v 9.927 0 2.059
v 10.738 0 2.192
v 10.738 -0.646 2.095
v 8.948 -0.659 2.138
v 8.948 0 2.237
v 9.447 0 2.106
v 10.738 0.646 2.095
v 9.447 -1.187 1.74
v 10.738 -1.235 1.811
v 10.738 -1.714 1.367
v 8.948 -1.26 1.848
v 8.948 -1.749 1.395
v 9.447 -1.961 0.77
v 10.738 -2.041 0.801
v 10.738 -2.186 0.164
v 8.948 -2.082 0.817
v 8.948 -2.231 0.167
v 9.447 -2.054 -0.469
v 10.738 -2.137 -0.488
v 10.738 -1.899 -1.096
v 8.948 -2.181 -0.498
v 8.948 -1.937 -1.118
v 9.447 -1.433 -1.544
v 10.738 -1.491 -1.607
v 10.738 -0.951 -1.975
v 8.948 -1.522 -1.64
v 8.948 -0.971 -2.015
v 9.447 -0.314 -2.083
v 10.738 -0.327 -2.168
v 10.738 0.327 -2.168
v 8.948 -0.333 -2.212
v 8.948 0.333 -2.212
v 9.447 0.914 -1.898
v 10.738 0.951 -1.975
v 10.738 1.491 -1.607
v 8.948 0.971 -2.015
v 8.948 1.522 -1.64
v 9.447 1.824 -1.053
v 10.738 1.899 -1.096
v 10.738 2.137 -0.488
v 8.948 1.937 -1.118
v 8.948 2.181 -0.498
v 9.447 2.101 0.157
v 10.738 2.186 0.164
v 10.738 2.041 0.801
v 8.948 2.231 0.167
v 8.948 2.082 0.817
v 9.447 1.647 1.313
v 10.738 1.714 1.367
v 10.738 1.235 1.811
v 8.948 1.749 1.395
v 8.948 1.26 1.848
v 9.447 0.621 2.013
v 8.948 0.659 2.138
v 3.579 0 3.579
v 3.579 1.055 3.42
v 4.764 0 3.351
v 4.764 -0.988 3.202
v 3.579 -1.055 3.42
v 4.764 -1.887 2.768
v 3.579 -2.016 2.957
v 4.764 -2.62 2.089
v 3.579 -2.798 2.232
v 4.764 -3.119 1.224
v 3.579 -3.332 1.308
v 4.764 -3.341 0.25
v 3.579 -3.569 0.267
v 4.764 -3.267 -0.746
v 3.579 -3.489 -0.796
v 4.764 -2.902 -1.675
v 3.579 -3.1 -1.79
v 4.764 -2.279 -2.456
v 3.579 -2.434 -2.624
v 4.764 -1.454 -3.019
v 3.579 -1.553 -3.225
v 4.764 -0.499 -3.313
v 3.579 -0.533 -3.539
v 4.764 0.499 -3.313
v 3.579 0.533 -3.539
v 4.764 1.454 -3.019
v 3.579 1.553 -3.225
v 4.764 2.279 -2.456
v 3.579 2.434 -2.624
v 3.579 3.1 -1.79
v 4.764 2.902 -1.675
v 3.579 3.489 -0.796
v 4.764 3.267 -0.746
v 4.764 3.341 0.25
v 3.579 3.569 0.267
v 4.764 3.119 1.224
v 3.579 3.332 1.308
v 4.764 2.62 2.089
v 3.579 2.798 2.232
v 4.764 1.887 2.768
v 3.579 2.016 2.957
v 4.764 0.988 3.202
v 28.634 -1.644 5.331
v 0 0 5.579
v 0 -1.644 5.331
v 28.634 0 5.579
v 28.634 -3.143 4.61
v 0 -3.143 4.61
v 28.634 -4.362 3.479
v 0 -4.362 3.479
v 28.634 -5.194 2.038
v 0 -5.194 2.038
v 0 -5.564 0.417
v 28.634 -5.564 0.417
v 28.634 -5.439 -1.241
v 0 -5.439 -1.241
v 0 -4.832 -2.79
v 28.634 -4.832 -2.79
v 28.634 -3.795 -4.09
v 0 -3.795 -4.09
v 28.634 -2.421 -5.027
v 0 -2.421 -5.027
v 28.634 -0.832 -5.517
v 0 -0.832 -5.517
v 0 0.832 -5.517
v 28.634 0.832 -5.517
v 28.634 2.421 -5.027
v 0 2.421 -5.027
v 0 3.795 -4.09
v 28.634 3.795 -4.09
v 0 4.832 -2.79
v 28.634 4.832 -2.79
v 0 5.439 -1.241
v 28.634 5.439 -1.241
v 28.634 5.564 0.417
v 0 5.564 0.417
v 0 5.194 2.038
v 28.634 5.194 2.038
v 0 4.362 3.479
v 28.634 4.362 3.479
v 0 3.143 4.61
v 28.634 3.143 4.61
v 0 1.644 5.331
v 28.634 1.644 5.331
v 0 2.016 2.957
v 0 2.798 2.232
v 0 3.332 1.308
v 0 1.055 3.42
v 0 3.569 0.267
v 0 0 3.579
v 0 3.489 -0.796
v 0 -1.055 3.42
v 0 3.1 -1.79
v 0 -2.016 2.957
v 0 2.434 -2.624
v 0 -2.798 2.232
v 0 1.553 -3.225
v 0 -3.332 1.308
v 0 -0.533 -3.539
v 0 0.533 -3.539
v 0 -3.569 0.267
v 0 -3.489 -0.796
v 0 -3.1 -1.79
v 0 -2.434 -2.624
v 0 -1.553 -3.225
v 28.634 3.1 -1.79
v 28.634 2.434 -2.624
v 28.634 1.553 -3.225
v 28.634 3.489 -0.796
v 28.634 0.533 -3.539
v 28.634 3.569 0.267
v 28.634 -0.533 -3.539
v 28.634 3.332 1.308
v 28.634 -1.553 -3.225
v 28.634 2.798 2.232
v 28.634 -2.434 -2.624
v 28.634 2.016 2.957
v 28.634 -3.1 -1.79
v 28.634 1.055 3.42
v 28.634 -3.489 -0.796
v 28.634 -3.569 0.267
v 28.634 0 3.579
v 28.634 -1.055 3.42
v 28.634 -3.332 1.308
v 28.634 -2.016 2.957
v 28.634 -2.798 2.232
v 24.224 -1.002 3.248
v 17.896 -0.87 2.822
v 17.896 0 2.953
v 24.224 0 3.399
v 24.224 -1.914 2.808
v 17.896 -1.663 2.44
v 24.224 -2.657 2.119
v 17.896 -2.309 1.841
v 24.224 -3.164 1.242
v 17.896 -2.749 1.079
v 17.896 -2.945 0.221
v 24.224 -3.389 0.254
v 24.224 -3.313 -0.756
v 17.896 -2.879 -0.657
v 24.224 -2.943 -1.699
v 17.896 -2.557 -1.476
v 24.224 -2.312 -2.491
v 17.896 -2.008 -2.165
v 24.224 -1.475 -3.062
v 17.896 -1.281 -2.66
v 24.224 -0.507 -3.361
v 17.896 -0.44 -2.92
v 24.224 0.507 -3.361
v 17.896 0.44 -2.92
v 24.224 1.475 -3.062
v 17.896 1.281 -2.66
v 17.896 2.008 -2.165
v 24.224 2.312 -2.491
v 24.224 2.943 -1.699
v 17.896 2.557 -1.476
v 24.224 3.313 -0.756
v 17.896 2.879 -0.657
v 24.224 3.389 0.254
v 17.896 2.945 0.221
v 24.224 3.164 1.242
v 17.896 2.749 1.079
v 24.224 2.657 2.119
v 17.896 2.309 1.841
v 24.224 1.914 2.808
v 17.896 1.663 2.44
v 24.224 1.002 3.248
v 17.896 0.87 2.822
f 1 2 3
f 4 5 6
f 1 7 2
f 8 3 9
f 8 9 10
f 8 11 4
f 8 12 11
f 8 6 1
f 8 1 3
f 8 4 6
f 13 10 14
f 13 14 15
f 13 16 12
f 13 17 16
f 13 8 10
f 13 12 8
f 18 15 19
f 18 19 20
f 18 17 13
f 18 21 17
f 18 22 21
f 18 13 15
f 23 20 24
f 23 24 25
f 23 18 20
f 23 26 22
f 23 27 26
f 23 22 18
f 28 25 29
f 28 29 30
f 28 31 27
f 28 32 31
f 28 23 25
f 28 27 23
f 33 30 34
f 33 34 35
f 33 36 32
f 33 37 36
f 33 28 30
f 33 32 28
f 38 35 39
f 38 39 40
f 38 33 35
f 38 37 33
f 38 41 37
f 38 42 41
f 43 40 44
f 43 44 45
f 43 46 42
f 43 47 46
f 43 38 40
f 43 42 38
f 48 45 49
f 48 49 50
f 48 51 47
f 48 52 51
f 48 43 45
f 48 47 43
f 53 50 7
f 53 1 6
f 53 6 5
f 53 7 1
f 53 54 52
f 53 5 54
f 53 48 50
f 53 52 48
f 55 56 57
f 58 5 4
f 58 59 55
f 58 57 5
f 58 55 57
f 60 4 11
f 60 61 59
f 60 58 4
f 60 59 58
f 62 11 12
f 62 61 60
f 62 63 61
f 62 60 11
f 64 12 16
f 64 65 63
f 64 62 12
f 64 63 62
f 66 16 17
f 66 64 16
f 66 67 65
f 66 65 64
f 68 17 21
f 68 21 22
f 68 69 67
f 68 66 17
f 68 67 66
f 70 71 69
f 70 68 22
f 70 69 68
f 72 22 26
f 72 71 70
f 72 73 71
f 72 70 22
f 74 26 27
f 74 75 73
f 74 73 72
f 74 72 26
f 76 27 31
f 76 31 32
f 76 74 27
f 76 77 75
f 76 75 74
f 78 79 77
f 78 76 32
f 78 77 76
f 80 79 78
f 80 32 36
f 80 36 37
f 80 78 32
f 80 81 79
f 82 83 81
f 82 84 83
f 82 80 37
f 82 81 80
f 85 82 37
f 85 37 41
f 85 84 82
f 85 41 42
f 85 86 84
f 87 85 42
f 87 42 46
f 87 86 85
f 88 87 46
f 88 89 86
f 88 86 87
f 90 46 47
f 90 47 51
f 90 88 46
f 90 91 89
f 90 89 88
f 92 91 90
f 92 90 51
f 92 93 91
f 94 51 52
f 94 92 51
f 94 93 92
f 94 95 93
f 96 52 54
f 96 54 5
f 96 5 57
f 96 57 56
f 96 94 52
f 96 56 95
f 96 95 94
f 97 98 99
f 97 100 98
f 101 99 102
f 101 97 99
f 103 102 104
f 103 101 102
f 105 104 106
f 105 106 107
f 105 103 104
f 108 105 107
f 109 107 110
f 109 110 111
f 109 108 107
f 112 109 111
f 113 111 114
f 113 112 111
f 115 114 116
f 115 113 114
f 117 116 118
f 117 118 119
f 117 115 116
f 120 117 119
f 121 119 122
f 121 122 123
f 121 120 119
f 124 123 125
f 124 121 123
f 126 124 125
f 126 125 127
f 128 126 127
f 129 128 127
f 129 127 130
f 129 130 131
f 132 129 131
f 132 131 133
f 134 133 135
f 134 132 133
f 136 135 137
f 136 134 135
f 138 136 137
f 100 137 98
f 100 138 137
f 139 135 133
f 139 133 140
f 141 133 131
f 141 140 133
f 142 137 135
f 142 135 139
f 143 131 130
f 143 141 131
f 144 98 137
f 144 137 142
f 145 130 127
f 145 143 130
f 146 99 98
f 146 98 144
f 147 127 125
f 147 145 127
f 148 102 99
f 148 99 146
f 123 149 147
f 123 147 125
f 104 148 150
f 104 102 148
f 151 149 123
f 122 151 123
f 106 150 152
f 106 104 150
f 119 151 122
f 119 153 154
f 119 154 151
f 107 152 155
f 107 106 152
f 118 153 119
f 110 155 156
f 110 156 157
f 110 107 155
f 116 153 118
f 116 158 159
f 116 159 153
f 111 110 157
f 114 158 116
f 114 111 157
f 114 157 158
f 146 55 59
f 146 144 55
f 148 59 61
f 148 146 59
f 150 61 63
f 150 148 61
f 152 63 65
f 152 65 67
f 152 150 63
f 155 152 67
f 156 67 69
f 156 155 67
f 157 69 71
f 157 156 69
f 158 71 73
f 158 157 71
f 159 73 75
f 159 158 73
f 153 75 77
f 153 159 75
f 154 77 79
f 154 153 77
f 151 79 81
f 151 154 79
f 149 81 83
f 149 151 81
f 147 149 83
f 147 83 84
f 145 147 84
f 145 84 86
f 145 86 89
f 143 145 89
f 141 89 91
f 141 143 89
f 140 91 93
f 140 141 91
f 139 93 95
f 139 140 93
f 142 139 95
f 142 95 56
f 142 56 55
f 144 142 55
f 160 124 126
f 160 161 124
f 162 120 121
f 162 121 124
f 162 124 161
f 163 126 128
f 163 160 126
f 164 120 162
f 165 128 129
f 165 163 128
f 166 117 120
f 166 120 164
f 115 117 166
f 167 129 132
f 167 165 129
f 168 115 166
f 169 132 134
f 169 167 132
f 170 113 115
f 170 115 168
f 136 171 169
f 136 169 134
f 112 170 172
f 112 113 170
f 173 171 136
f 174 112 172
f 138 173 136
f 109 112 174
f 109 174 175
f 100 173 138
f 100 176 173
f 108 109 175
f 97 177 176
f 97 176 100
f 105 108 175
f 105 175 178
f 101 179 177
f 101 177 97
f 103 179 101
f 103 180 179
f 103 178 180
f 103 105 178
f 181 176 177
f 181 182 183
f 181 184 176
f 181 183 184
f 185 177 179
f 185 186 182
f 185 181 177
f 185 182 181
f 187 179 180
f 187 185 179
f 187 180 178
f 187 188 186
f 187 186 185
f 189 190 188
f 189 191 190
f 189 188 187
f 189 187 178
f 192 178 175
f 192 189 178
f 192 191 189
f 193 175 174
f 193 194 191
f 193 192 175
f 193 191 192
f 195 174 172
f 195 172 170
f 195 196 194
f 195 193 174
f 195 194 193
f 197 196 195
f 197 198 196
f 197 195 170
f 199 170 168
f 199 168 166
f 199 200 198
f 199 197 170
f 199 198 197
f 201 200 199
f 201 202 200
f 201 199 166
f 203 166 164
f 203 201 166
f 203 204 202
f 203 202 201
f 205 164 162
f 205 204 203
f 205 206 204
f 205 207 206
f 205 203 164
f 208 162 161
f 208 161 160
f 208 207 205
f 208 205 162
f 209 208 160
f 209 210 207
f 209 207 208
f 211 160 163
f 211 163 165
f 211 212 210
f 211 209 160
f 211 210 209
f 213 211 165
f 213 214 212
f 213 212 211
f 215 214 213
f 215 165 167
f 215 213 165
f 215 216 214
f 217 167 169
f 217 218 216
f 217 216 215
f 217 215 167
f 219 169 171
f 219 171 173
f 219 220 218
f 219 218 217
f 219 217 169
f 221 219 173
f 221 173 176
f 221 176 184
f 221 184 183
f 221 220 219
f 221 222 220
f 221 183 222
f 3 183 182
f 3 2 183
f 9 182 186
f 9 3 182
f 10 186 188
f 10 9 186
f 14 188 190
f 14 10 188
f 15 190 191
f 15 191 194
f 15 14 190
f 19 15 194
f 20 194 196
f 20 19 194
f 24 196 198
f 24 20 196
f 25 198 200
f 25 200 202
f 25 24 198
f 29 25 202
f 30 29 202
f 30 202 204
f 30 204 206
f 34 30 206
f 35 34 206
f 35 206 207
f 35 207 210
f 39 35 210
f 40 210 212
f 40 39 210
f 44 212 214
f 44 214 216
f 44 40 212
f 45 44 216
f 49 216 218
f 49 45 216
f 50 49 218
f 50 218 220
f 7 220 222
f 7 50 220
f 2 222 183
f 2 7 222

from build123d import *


with BuildPart() as part:
    # Çizim1 → Döndür1 (revolve)
    with BuildSketch(Plane.XY, mode=Mode.PRIVATE) as d_nd_r1_sk:
        with BuildLine():
            Line((0, 3.579194929), (0, 5.579194929))
            Line((0, 5.579194929), (28.633559429, 5.579194929))
            Line((28.633559429, 5.579194929), (28.633559429, 3.579194929))
            add(Edge.make_bspline(
                [(28.633559429, 3.579194929), (27.288838094, 3.548816487), (25.94574747, 3.488391293), (24.748521533, 3.434528502), (23.260655716, 3.339684727), (22.168090491, 3.270039326), (20.577168186, 3.160049078), (18.972661187, 3.049119636), (17.895974643, 2.952835816)],
                knots=[0, 0, 0, 0.25, 0.25, 0.5, 0.5, 0.75, 0.75, 1, 1, 1], degree=2))
            add(Edge.make_bspline(
                [(17.895974643, 2.952835816), (17.016914527, 2.874224946), (16.105027852, 2.777807374), (15.209638282, 2.68313411), (14.314000801, 2.590835616), (13.279719039, 2.484249356), (12.523454468, 2.415618194), (11.872051374, 2.356503232), (11.629830944, 2.328808469), (11.12877327, 2.271519025), (10.737584786, 2.192256894)],
                knots=[0, 0, 0, 0.25, 0.25, 0.5, 0.5, 0.75, 0.75, 0.875, 0.875, 1, 1, 1], degree=2))
            add(Edge.make_bspline(
                [(10.737584786, 2.192256894), (10.714074676, 2.187493304), (10.512578349, 2.144841622), (10.375927725, 2.115916137), (10.287749162, 2.100239226), (10.029922524, 2.054401271), (9.838984818, 2.058105153), (9.641656407, 2.061933004), (9.392069372, 2.118364338), (9.323124419, 2.13395271), (9.243676092, 2.154758174), (9.172398085, 2.173424042), (8.947987317, 2.236996832)],
                knots=[0, 0, 0, 0.125, 0.125, 0.25, 0.25, 0.5, 0.5, 0.75, 0.75, 0.833333333, 0.833333333, 1, 1, 1], degree=2))
            add(Edge.make_bspline(
                [(8.947987317, 2.236996832), (8.611069002, 2.332441616), (8.277782612, 2.419397953), (7.944213186, 2.506428137), (7.610689869, 2.593634853), (7.038993583, 2.743116922), (6.273401544, 2.950182282), (5.296586681, 3.214375888), (4.936190954, 3.306956399), (4.523411411, 3.412993564), (4.261226163, 3.46829567), (3.888947479, 3.546819522), (3.579194929, 3.579194929)],
                knots=[0, 0, 0, 0.125, 0.125, 0.25, 0.25, 0.5, 0.5, 0.75, 0.75, 0.875, 0.875, 1, 1, 1], degree=2))
            add(Edge.make_bspline(
                [(3.579194929, 3.579194929), (3.198899414, 3.618943502), (2.68688793, 3.610100237), (2.462280286, 3.6062209), (2.238325099, 3.596581704), (2.013998548, 3.586926525), (1.789597465, 3.579194929), (0.89245554, 3.548284476), (0, 3.579194929)],
                knots=[0, 0, 0, 0.25, 0.25, 0.375, 0.375, 0.5, 0.5, 1, 1, 1], degree=2))
        make_face()
    revolve(d_nd_r1_sk.sketch.rotate(Axis((0, 0, 0), (1, 0, 0)), 90), axis=Axis((0, 0, 0), (1, 0, 0)))


solid = part.part
